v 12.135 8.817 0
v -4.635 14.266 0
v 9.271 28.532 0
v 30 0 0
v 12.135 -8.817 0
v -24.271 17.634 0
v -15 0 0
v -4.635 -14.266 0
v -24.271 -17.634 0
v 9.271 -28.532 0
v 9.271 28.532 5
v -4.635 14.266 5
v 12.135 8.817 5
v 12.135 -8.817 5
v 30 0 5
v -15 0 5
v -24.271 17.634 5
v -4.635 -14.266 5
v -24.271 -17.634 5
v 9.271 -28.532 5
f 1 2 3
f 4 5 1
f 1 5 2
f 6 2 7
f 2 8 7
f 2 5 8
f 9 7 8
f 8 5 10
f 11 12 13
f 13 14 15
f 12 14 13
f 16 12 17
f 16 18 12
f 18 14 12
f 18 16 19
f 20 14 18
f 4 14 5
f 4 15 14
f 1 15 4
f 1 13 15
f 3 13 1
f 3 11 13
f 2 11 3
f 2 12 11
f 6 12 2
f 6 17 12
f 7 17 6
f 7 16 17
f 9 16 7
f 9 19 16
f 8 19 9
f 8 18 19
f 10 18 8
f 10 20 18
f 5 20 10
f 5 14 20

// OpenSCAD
/*
 * =====================================
 *   This is public Domain Code
 *   Contributed by: Gael Lafond
 *   4 November 2018
 * =====================================
 *
 * Library used to create stars.
 *
 * Inspired from Juan Gonzalez-Gomez (Obijuan):
 *   https://www.thingiverse.com/thing:5052
 *
 * GPL license
 */

number_of_points = 5; // [2:100]
inner_radius = 15; // [1:100]
outer_radius = 30; // [1:100]
height = 5; // [1:100]

linear_extrude(height) {
	star(n=number_of_points, ri=inner_radius, ro=outer_radius);
}

/**
 * The 2*N points of an N-pointed star are calculated as follows:
 * There are two circunferences: the inner and outer. Outer points are located
 * on the outer circunference defined by "ro". The inner points are 360/(2*N) rotated
 * respect to the outers. They are located on the inner circunference defined by "ri".
 */

/**
 * Draw a 2D star polygon.
 * @param {integer} n: Number of points
 * @param {float} ri: Inner radius
 * @param {float} ro: Outer radius
 */
module star(n=5, ri=15, ro=30) {
	if (n > 1) {
		polygon([
			for (i = [0 : n-1], in = [true, false])
				in ?
					[ri*cos(-360*i/n + 360/(n*2)), ri*sin(-360*i/n + 360/(n*2))] :
					[ro*cos(-360*i/n), ro*sin(-360*i/n)]
		]);
	}
}
